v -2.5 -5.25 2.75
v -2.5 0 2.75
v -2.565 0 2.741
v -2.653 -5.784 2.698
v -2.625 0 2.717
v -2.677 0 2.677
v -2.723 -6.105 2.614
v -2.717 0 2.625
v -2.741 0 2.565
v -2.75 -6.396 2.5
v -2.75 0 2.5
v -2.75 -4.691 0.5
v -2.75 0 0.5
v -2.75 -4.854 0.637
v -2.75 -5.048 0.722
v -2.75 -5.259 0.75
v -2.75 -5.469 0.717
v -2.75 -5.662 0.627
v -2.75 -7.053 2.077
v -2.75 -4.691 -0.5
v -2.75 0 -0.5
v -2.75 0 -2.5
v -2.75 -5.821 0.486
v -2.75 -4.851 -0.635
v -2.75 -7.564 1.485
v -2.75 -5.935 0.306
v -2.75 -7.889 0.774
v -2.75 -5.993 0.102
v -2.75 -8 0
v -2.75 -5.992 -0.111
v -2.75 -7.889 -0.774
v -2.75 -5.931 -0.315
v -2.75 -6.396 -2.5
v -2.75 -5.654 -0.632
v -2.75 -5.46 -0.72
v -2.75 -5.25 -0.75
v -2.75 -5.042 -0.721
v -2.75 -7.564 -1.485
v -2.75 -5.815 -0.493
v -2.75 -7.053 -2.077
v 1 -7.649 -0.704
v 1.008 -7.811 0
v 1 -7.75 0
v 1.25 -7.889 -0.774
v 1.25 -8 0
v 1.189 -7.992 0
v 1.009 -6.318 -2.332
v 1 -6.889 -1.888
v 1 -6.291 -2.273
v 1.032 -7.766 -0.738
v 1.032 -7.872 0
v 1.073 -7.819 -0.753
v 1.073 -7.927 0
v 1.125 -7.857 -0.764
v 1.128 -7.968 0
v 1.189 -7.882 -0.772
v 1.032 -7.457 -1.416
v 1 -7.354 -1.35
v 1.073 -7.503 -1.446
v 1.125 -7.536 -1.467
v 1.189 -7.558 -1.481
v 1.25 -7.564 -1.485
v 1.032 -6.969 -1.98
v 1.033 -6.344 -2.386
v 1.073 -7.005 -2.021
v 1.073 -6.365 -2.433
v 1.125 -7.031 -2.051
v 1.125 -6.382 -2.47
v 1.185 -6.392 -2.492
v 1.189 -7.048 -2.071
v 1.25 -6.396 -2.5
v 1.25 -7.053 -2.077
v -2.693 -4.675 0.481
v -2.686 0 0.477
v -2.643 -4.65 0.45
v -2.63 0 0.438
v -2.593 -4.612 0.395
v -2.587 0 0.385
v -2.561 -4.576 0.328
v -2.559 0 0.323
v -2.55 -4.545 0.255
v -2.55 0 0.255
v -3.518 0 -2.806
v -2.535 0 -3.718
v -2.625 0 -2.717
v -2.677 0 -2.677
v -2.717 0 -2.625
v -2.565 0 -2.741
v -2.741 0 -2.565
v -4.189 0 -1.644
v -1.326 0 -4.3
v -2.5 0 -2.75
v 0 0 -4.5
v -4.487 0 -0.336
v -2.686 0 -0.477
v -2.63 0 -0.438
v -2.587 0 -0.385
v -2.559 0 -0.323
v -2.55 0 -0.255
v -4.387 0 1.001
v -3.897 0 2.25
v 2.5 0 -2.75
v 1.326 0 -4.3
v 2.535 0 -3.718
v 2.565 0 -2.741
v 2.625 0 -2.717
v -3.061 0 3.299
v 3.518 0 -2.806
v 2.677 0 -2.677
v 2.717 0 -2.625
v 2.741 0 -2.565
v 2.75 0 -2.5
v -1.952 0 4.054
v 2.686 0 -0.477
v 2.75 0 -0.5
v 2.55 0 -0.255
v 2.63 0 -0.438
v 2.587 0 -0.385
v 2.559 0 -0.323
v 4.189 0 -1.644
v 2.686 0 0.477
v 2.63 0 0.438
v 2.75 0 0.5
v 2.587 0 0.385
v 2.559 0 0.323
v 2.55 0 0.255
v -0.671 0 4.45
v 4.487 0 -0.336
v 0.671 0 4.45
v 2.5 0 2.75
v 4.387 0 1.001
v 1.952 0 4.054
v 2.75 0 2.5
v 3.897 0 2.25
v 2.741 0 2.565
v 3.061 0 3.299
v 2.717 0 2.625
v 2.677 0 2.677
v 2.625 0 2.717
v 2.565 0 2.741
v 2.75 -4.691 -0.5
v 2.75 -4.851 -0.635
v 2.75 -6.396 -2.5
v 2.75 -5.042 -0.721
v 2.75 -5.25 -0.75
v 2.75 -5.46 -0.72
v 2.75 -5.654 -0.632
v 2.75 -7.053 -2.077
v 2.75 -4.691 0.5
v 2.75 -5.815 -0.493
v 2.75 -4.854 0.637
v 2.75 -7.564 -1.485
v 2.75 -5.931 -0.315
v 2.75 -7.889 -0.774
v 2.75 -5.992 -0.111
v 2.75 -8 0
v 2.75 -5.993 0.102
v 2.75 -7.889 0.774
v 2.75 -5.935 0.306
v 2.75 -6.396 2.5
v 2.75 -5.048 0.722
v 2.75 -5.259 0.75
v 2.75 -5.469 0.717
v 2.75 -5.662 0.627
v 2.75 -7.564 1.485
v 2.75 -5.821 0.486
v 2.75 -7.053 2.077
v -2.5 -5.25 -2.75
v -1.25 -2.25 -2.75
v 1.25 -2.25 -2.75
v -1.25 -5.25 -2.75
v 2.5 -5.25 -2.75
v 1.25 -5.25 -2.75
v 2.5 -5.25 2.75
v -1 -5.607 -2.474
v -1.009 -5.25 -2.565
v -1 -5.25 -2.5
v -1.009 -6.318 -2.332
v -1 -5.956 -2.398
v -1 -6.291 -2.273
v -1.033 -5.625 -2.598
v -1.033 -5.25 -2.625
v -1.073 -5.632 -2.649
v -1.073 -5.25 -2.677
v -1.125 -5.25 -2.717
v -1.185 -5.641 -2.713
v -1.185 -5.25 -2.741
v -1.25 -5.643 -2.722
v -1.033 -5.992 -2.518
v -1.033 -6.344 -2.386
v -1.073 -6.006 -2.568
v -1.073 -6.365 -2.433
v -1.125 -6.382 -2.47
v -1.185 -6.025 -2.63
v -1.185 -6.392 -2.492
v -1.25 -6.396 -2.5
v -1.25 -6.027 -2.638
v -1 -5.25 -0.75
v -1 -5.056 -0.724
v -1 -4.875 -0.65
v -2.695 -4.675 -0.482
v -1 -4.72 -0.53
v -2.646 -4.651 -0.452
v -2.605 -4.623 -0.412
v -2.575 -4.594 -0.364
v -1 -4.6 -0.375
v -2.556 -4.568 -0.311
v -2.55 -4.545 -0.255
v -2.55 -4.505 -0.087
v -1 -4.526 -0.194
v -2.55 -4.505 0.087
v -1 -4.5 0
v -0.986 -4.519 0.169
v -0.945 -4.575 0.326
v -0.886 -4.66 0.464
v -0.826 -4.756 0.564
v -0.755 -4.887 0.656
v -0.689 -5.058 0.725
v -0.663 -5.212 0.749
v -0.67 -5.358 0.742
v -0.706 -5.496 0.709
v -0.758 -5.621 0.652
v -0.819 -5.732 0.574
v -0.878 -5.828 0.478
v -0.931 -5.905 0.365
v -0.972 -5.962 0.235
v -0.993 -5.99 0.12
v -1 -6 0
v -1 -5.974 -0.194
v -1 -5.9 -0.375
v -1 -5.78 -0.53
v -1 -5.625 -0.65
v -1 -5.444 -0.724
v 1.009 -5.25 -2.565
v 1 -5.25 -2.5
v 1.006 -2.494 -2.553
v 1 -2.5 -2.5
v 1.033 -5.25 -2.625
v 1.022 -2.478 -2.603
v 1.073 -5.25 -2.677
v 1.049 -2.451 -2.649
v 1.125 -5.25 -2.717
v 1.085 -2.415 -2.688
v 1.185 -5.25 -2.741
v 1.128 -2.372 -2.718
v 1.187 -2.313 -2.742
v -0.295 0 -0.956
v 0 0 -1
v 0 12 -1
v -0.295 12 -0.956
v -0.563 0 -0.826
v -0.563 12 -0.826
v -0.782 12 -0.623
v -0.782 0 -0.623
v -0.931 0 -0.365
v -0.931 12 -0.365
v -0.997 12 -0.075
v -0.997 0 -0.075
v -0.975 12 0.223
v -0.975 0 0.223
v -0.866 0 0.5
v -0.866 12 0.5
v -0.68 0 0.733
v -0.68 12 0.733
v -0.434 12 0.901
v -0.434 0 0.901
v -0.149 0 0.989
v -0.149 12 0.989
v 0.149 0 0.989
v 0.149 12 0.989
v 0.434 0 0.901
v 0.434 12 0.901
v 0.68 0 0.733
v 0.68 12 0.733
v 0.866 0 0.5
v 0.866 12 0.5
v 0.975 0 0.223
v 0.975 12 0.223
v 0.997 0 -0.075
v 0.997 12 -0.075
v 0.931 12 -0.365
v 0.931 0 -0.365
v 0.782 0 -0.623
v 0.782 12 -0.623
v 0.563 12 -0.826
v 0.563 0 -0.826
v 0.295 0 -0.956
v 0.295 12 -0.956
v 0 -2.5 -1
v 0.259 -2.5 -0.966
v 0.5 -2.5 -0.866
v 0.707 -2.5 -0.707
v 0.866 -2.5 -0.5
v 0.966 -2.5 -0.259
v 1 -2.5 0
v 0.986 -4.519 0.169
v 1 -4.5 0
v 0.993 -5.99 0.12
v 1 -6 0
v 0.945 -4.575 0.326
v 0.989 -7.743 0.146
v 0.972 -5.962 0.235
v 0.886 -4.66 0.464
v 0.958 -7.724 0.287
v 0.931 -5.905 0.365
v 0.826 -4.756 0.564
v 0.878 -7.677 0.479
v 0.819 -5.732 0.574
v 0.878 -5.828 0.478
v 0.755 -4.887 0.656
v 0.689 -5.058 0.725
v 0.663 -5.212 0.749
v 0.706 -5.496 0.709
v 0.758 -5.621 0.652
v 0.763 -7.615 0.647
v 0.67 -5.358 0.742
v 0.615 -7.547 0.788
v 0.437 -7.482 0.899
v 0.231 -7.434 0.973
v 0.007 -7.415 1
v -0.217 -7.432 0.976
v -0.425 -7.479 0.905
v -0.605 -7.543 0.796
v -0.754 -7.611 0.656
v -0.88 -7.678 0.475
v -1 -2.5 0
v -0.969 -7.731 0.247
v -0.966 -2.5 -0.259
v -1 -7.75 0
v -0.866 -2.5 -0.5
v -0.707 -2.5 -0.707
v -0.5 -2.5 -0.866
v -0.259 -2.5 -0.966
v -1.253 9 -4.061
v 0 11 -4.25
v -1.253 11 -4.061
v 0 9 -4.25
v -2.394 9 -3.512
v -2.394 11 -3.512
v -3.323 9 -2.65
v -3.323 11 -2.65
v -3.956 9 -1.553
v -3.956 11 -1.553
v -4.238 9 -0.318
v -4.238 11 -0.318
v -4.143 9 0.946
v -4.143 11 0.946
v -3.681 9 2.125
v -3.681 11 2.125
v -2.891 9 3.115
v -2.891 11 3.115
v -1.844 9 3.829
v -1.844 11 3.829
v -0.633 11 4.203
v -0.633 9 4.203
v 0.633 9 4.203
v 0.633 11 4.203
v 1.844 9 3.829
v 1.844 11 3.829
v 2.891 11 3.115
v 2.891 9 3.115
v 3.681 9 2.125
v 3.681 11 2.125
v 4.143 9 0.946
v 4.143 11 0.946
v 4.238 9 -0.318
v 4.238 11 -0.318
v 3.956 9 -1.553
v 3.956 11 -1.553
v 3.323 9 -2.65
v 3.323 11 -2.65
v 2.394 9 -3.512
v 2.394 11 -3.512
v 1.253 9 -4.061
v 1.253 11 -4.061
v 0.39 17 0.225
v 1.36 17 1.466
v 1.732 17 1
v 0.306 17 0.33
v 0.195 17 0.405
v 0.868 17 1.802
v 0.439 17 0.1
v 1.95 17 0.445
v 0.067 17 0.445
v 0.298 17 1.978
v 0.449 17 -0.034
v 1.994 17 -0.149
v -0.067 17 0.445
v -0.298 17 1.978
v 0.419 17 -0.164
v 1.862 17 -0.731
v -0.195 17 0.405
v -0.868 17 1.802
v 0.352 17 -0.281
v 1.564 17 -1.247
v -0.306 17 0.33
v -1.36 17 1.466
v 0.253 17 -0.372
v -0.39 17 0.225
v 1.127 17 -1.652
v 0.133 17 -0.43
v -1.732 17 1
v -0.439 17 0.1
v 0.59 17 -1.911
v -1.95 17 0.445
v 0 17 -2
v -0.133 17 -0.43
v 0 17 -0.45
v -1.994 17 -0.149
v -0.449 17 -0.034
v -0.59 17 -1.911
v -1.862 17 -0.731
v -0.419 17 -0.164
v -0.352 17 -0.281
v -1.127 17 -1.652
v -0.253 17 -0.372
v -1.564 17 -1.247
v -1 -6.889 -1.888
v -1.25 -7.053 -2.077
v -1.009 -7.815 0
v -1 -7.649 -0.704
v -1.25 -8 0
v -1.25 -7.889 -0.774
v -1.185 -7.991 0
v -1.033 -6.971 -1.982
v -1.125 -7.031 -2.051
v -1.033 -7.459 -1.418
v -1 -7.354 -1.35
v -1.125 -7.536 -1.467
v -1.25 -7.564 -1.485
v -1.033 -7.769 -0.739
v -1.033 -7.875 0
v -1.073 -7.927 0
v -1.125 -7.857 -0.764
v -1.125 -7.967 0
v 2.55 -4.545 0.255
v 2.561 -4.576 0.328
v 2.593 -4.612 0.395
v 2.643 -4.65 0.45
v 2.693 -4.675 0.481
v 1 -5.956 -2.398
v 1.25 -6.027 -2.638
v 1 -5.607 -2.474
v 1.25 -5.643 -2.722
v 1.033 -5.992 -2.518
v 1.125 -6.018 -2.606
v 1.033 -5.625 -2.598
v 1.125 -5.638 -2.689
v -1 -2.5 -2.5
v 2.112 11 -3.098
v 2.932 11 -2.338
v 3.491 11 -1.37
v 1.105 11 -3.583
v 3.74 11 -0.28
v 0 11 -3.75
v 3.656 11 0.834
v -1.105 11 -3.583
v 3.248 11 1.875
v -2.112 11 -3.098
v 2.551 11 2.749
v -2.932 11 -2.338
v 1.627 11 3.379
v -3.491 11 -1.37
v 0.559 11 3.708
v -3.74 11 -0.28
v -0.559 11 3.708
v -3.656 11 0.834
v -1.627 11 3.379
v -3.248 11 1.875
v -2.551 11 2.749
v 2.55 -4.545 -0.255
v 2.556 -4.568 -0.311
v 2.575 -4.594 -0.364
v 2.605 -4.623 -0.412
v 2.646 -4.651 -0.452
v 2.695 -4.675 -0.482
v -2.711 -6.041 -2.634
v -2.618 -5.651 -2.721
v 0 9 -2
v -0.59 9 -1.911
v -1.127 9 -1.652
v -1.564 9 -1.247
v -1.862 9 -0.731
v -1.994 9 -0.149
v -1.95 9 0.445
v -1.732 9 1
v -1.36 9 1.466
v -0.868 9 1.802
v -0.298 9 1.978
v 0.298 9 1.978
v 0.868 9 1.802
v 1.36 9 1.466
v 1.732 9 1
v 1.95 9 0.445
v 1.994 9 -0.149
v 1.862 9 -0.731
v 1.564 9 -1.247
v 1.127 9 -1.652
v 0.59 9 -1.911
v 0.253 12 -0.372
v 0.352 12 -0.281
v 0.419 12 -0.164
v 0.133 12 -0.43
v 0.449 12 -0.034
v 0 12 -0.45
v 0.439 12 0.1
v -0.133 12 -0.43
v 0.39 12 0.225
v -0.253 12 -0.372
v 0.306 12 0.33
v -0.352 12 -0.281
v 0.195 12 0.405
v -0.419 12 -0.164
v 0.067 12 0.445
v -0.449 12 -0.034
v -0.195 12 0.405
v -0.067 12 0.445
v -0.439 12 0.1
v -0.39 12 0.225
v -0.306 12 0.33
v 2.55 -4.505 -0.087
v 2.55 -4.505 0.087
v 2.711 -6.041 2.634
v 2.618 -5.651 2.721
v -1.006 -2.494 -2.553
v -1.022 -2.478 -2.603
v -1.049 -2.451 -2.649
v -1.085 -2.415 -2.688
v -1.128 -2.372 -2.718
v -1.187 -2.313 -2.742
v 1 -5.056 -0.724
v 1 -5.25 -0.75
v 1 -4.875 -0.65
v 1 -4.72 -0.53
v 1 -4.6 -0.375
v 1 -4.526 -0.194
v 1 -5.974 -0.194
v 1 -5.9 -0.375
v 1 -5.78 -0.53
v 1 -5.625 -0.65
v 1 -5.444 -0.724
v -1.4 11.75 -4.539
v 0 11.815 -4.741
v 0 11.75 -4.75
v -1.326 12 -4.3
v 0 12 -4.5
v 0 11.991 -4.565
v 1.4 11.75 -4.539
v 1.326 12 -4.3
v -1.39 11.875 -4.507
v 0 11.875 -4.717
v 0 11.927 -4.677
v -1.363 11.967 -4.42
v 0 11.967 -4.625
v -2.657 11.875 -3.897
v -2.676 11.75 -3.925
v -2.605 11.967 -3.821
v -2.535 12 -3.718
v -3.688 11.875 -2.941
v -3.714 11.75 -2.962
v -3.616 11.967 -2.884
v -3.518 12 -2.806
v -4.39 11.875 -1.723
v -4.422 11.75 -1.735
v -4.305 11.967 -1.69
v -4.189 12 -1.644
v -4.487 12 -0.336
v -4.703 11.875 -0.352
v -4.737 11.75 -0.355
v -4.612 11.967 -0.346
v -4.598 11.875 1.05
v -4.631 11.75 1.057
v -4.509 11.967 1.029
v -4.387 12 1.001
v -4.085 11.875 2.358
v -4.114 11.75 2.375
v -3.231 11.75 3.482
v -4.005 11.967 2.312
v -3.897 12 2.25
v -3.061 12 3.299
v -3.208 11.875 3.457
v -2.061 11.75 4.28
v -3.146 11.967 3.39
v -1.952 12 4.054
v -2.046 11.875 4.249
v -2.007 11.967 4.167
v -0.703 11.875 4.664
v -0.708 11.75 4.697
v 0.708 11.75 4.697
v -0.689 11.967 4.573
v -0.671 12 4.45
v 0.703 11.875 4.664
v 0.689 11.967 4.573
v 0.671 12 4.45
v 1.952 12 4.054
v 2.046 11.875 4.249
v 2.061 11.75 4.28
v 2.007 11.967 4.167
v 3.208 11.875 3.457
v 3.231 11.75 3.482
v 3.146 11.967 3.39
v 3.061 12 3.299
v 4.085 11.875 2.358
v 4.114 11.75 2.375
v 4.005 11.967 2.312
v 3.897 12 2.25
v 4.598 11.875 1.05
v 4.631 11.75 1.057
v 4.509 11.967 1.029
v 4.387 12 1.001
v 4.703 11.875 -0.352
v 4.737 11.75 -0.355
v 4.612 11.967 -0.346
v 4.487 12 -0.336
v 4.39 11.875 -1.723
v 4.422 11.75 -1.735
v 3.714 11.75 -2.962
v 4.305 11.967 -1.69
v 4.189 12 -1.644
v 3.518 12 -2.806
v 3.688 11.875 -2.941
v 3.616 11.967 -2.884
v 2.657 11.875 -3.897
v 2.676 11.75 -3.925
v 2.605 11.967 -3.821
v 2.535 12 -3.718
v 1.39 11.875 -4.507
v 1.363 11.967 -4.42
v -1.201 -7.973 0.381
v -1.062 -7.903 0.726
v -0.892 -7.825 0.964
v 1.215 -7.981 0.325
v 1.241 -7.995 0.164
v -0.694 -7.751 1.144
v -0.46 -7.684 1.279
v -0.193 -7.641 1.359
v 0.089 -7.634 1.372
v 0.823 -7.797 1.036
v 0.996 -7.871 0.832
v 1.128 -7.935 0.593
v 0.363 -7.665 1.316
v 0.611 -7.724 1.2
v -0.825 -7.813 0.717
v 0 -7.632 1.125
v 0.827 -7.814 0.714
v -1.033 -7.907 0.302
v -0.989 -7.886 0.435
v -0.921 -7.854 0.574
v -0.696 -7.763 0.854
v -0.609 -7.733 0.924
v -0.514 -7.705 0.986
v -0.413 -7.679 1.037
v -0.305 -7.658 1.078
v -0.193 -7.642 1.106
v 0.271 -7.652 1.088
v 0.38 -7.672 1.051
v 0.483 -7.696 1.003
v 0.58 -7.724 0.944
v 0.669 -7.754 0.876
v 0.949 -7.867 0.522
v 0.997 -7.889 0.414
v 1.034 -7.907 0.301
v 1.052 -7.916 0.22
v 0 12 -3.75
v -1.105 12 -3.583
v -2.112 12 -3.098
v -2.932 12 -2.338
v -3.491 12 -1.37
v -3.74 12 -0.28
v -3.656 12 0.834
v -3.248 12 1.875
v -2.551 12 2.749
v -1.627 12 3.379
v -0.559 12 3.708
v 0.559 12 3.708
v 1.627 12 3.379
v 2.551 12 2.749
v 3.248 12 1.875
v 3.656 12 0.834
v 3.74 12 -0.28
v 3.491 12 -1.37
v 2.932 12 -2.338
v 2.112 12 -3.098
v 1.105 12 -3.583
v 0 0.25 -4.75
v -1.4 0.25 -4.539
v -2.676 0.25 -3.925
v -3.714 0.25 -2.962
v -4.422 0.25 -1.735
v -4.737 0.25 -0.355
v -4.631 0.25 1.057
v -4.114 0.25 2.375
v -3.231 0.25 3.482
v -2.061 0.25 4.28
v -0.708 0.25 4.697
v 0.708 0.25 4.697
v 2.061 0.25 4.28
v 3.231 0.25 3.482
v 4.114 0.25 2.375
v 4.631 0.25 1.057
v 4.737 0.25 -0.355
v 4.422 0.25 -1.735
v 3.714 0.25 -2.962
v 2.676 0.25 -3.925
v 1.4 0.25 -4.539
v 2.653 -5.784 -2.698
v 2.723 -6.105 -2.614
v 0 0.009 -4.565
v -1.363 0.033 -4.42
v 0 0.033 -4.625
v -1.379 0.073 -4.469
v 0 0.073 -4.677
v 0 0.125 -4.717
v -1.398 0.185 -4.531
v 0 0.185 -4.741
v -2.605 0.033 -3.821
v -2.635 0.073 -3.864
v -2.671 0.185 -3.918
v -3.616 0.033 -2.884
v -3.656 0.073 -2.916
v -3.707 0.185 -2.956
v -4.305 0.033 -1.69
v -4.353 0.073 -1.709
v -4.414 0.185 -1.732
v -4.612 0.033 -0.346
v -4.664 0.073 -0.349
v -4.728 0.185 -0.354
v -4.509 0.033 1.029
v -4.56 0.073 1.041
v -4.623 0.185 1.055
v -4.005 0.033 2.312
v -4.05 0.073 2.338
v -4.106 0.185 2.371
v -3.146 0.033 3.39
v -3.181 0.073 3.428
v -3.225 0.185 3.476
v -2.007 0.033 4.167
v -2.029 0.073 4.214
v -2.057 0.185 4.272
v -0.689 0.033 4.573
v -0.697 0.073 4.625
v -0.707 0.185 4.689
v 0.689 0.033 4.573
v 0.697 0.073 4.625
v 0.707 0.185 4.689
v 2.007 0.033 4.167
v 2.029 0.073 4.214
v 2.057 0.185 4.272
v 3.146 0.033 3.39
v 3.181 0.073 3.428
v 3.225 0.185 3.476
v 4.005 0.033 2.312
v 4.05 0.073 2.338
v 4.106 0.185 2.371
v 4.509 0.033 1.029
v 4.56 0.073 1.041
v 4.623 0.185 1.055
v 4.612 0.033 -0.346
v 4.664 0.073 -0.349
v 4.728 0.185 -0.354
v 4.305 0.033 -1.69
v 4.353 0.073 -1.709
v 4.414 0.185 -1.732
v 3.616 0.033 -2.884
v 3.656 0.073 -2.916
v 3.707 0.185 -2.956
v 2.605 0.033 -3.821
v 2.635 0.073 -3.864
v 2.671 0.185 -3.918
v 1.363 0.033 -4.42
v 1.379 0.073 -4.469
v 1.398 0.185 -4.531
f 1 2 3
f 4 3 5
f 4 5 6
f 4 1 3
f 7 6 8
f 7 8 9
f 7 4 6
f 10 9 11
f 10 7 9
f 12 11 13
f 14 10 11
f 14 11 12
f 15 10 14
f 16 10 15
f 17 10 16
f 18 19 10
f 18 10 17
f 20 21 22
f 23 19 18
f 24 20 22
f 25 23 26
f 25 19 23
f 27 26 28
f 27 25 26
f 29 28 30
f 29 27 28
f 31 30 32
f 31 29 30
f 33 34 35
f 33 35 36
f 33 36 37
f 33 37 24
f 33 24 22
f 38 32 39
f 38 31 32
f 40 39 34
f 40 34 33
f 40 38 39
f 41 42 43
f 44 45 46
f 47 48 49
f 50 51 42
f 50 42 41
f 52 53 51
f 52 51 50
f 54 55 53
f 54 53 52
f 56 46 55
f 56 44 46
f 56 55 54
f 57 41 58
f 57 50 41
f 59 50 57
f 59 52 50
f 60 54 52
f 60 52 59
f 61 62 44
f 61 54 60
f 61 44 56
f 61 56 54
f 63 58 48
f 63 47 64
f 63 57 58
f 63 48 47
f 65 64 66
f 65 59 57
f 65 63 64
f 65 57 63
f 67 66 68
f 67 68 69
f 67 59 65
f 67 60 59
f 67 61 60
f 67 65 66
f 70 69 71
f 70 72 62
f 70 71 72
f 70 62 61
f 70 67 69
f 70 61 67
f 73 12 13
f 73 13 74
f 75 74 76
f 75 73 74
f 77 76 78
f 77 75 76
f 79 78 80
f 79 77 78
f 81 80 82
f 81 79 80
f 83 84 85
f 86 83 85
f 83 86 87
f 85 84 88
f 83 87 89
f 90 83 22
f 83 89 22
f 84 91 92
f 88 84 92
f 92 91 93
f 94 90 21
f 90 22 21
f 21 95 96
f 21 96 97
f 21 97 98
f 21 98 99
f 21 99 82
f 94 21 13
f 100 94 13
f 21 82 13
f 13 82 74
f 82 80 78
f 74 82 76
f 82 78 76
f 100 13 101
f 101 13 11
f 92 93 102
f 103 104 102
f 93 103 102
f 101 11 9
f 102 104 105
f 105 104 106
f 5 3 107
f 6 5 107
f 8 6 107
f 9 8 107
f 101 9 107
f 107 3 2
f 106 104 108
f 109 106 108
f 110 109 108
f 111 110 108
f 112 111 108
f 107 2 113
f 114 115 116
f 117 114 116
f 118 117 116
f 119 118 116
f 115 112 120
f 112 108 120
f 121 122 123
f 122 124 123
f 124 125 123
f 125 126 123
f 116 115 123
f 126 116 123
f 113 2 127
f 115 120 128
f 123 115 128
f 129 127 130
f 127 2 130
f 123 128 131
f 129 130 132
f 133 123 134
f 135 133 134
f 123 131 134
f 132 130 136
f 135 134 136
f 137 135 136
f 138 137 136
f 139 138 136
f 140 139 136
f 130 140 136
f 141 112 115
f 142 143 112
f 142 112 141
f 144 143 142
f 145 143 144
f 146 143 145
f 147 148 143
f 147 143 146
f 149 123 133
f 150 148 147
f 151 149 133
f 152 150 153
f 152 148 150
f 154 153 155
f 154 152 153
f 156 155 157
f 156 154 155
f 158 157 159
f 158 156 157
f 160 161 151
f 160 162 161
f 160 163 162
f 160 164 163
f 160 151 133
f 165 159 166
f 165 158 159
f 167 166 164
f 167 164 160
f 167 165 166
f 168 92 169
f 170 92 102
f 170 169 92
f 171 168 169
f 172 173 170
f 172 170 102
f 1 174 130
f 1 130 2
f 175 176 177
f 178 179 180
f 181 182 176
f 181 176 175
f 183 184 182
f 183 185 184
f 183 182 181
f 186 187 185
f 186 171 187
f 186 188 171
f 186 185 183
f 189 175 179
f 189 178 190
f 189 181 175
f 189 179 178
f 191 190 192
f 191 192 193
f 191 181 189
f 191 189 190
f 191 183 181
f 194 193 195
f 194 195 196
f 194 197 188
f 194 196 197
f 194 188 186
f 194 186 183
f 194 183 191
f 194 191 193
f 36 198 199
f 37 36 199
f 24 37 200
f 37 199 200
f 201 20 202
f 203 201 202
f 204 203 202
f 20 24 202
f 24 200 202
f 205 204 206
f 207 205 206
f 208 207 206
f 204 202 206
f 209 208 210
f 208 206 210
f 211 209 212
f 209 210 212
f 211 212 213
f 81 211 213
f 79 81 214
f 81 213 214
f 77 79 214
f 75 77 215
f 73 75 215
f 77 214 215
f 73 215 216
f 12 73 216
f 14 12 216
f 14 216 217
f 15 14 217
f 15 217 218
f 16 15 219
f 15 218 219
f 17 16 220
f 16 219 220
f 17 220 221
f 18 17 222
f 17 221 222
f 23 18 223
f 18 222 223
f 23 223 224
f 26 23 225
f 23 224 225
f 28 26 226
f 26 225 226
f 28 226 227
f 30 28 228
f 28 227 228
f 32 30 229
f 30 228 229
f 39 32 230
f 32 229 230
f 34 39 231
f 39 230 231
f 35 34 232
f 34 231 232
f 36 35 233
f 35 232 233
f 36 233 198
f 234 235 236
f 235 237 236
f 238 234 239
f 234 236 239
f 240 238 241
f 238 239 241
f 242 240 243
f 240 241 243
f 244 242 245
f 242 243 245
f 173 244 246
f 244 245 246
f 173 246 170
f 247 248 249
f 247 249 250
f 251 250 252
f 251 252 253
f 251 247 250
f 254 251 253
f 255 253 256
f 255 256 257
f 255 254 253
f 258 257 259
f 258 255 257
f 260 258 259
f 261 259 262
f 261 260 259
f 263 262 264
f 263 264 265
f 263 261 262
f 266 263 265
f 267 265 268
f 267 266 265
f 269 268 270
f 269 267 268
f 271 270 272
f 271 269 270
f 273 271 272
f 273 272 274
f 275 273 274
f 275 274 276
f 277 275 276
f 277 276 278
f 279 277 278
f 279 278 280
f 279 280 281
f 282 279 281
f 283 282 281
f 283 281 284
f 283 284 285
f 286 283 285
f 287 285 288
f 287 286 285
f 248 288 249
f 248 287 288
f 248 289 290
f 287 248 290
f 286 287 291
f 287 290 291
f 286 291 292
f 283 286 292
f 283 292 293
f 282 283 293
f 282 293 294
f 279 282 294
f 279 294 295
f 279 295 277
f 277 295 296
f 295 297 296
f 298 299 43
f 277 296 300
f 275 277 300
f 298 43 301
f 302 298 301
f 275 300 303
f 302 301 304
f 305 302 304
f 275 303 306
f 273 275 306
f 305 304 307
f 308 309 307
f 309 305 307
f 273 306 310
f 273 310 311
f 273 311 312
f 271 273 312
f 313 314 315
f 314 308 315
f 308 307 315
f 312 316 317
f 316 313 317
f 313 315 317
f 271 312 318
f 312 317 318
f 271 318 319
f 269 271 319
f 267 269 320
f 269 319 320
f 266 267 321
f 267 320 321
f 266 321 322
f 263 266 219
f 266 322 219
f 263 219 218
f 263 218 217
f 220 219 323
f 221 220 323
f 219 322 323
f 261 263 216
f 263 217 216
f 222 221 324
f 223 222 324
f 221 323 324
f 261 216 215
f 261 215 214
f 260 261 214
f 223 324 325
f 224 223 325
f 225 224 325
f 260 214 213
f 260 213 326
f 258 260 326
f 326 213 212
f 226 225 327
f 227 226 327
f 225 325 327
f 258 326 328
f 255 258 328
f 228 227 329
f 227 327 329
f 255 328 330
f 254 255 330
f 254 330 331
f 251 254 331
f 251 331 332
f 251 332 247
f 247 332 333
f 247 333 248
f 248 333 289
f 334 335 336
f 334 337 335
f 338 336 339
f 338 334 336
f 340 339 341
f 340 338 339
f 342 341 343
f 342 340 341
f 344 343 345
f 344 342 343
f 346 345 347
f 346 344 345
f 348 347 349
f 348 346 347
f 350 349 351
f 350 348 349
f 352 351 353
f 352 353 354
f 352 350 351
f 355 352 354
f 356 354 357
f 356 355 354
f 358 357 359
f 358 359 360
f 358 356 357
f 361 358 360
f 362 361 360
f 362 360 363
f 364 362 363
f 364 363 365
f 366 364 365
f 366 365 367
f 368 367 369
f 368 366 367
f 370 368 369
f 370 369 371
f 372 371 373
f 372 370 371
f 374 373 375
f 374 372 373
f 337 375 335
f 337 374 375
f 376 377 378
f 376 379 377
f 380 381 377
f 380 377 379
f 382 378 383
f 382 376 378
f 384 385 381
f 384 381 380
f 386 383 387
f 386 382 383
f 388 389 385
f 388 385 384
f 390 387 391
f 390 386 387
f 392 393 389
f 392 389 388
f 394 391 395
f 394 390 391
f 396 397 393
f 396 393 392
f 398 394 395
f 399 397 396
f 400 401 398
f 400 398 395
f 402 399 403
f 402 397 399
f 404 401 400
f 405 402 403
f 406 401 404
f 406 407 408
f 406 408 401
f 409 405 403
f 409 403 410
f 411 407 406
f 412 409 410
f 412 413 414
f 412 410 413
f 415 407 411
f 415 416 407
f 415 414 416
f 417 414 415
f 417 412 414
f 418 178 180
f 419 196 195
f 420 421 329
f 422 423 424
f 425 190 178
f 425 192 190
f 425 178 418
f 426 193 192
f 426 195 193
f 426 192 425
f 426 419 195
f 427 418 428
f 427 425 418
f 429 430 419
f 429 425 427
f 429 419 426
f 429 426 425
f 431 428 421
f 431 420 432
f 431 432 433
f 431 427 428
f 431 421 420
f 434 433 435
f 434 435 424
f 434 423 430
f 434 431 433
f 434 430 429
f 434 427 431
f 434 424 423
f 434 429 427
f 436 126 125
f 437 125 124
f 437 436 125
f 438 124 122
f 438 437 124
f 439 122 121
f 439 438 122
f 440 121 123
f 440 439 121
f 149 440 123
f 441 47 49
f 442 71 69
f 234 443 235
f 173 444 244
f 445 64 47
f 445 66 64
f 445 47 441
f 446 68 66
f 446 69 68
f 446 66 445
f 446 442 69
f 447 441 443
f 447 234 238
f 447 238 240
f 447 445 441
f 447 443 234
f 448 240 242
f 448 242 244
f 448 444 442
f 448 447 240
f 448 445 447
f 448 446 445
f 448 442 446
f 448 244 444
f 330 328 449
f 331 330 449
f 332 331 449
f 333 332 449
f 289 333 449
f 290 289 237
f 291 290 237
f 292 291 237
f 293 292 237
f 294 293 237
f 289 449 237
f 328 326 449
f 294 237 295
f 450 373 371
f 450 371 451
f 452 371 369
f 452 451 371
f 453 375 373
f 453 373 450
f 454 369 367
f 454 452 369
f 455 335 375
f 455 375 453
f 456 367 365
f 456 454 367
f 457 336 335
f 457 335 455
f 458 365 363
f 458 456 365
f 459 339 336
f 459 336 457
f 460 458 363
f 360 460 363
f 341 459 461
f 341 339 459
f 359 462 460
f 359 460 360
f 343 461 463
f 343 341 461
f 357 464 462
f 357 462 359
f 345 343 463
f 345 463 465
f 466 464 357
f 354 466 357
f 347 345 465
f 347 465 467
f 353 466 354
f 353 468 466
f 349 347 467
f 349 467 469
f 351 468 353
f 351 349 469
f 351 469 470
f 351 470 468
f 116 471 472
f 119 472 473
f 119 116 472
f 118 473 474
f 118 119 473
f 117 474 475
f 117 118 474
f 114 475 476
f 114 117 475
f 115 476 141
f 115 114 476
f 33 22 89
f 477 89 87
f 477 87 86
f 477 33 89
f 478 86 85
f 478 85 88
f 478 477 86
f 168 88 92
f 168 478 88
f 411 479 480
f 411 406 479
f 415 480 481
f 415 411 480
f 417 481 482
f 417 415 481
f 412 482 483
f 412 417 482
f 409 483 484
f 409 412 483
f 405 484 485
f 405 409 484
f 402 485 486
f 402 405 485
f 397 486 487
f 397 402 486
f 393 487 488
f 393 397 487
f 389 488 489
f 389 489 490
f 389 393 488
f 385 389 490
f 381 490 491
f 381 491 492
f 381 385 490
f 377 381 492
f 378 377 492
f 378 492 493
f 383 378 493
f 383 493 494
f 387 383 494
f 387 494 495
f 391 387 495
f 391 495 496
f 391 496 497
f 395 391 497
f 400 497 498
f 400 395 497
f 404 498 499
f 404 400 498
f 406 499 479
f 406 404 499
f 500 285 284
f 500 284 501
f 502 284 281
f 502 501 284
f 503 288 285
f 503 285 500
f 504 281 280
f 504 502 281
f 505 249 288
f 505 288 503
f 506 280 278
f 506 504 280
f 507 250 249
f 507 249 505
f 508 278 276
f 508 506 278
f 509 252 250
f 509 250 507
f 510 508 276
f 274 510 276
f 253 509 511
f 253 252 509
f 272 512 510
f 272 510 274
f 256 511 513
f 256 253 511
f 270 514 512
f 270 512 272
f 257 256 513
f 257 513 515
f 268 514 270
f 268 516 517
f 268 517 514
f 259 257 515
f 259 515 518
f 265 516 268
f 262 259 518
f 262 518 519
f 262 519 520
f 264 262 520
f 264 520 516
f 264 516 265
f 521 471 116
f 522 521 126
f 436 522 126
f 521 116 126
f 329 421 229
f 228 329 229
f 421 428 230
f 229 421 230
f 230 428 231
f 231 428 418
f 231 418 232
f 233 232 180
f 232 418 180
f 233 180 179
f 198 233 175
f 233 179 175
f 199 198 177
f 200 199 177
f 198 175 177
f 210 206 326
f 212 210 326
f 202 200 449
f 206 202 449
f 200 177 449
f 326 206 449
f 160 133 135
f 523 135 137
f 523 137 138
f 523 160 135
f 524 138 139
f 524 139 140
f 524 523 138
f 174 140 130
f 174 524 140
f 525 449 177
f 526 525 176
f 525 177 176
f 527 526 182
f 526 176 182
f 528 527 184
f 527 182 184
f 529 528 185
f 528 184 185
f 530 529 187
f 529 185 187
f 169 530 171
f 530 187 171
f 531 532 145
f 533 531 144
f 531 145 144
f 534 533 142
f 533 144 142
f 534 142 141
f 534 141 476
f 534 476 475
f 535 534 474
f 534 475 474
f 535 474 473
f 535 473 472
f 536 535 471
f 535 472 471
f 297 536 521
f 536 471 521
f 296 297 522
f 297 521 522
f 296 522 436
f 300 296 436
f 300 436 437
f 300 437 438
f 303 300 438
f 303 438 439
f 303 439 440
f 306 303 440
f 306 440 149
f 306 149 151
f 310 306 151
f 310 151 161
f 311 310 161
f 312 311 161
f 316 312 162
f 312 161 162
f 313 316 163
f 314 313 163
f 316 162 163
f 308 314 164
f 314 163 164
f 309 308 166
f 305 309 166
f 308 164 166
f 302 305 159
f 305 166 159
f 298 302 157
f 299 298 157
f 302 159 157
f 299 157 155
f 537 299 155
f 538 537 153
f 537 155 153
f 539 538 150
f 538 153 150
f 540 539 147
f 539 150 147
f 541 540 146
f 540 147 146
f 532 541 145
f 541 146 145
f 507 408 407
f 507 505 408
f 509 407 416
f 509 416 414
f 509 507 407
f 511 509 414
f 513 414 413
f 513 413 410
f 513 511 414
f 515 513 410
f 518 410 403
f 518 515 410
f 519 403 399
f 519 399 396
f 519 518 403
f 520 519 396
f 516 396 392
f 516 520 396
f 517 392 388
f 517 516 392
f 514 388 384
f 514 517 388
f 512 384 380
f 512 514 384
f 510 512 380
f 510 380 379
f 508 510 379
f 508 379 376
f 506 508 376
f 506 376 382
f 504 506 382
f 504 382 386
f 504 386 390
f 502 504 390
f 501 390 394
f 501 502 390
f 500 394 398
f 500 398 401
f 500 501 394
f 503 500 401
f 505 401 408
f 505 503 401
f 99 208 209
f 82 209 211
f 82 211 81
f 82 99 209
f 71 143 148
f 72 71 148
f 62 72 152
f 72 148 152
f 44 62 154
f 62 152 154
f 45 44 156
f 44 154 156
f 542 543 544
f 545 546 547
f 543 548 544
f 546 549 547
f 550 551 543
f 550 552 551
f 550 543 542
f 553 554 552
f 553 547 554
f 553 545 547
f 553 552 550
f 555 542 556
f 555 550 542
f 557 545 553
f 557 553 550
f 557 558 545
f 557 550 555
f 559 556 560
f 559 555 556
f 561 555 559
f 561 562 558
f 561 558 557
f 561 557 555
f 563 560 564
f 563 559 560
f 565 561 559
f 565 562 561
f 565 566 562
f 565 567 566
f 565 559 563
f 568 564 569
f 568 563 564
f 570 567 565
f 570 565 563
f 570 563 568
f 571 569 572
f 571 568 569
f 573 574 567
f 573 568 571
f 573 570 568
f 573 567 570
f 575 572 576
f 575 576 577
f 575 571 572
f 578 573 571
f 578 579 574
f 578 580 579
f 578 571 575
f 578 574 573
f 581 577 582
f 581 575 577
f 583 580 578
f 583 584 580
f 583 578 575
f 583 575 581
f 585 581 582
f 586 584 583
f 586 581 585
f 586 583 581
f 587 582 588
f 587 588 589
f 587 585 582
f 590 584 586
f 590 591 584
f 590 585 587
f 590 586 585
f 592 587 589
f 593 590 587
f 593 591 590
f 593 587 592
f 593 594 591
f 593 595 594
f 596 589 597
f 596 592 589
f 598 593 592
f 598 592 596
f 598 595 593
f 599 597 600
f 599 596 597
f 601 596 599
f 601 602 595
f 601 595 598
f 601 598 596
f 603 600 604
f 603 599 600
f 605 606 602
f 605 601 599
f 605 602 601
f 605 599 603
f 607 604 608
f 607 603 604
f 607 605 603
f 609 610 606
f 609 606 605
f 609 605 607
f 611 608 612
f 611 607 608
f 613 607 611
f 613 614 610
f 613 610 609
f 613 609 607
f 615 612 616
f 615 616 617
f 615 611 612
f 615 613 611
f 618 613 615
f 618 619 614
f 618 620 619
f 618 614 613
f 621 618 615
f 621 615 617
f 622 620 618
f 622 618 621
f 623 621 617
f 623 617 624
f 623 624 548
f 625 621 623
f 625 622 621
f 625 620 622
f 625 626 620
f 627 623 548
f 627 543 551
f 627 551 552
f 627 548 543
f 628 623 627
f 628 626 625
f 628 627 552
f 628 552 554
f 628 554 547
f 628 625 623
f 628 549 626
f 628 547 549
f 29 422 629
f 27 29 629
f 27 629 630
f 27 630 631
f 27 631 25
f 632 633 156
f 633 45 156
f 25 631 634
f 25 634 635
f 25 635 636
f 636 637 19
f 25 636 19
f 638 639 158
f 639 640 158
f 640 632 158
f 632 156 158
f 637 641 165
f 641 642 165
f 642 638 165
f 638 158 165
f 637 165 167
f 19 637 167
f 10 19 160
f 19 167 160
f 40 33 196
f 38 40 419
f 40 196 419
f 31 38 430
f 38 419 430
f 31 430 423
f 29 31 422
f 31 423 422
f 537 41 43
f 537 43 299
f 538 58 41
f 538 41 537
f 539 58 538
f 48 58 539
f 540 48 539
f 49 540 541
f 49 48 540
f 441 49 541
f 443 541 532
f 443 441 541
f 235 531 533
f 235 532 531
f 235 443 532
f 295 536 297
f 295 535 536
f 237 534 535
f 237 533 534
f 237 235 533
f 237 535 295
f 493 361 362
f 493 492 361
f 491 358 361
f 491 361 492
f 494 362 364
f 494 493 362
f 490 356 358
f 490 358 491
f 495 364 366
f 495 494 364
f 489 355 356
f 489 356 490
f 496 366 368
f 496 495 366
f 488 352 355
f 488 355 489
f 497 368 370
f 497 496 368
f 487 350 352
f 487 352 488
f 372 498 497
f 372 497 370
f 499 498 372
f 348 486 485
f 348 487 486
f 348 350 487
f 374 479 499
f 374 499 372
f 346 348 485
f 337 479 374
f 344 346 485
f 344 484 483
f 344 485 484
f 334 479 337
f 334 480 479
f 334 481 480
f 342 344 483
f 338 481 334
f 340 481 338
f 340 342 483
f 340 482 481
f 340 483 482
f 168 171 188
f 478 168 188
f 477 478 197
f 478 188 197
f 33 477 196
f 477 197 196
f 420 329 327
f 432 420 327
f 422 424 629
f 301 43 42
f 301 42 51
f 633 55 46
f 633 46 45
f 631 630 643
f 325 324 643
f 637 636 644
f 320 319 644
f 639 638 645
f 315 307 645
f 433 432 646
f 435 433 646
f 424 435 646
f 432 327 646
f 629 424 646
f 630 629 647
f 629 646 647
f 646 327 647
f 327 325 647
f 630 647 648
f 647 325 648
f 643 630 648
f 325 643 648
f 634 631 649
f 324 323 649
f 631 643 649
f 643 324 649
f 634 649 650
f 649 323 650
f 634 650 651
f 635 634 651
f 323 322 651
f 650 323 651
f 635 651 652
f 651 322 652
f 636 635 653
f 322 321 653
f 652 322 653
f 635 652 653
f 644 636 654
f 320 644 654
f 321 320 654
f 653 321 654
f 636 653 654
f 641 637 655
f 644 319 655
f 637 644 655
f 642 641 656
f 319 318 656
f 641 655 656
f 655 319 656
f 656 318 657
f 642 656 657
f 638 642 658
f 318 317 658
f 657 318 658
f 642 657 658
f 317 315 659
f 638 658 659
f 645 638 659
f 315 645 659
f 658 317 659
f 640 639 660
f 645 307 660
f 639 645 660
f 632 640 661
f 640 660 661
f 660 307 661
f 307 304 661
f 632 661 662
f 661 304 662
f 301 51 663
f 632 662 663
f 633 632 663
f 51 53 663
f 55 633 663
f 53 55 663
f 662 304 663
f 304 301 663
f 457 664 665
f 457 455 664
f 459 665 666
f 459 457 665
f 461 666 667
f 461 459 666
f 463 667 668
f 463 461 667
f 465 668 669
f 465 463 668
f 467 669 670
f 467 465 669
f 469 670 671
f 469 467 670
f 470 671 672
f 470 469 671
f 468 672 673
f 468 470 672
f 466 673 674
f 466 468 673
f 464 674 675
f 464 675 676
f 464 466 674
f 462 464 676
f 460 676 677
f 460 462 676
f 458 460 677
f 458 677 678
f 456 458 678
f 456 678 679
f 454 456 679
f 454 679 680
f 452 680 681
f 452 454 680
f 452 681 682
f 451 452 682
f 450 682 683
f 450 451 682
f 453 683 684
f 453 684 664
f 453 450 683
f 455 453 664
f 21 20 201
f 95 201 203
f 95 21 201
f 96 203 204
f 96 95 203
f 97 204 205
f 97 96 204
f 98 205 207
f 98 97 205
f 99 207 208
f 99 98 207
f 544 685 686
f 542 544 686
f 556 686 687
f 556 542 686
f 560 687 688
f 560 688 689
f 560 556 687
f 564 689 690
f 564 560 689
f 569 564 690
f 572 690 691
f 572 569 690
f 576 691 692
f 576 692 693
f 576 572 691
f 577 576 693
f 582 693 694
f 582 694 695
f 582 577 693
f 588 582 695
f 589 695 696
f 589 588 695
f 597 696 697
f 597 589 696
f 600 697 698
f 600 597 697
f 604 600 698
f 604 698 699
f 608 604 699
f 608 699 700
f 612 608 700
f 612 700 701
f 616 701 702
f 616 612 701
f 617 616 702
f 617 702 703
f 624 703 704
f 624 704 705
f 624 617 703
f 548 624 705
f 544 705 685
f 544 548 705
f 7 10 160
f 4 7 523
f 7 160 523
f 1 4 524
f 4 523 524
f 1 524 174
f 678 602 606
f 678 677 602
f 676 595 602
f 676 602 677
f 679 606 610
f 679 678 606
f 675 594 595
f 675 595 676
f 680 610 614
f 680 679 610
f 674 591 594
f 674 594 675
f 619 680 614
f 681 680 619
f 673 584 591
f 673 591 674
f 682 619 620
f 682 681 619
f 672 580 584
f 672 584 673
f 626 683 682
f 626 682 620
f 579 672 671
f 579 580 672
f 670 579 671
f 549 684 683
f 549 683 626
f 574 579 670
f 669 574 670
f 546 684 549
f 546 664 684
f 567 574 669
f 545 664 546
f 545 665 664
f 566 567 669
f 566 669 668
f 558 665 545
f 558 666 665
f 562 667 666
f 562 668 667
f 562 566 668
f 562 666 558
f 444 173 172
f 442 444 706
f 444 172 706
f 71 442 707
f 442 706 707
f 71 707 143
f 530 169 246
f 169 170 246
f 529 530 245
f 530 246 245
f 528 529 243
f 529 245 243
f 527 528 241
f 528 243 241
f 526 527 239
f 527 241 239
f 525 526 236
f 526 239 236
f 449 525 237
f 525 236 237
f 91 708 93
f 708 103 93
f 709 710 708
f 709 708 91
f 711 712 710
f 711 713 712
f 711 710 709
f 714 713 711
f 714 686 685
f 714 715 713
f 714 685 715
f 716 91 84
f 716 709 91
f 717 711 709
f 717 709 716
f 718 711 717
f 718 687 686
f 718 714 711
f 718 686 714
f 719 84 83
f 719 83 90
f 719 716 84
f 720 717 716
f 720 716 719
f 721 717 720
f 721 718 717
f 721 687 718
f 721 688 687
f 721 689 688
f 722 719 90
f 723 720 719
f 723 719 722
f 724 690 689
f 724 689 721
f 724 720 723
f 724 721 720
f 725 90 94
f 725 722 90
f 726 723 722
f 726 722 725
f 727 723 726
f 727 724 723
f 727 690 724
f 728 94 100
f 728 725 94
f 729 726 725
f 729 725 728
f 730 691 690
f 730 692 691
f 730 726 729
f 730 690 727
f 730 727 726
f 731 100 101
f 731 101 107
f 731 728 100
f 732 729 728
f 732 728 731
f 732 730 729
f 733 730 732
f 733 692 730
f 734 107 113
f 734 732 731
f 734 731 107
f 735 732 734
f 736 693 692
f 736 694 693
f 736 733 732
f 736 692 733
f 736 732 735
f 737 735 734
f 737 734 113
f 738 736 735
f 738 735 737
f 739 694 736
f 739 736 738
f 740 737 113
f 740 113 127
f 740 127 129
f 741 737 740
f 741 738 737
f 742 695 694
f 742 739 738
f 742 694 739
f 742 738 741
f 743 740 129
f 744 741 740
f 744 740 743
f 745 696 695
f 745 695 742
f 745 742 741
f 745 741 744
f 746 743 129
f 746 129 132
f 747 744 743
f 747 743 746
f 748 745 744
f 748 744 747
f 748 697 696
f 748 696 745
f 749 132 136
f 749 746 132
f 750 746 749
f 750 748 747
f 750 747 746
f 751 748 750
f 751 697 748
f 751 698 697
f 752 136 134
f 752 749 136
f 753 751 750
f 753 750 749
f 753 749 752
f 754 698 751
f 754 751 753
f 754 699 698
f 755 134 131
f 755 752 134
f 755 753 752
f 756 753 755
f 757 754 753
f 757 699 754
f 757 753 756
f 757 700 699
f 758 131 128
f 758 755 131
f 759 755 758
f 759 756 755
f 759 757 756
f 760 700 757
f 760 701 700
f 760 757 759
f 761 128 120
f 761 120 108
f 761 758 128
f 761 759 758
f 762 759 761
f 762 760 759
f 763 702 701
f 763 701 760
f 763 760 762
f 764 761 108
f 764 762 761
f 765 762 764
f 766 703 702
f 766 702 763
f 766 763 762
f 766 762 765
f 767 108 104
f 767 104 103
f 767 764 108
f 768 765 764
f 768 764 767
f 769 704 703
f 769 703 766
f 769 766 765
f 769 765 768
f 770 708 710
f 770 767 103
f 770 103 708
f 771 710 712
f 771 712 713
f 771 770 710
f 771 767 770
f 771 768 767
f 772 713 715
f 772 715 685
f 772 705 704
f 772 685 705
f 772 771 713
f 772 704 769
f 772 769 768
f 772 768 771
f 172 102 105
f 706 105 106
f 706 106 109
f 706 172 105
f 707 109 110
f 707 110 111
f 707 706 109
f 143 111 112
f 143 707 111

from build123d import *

# Parameters (mm, degrees)
BOSS_EXTRU_2_START      = 8
ESQUISSE4_R             = 1
BOSS_EXTRU_2_DEPTH      = 8
ENL_V_MAT_EXTRU_1_DEPTH = 20.178438414
ENL_V_MAT_EXTRU_2_REACH = 21.178
ESQUISSE6_W             = 2
ESQUISSE6_H             = 5.5
CONG_1_R                = 0.25
ESQUISSE7_W             = 1
ESQUISSE7_H             = 4.690983006
ENL_V_MAT_EXTRU_3_DEPTH = 0.2
CONG_2_R                = 0.25
CONG_2_OF_SYM_TRIE1_R   = 0.25


with BuildPart() as part:
    # Esquisse1 → Révolution1 (revolve)
    with BuildSketch(Plane.XY, mode=Mode.PRIVATE) as r_volution1_sk:
        with BuildLine():
            Line((2, 9), (2, 17))
            Line((2, 17), (0.45, 17))
            Line((0.45, 17), (0.45, 12))
            Line((0.45, 12), (1, 12))
            Line((1, 12), (1, 0))
            Line((1, 0), (4.5, 0))
            ThreePointArc((4.5, 0), (4.676776695, 0.073223305), (4.75, 0.25))
            Line((4.75, 0.25), (4.75, 11.75))
            ThreePointArc((4.75, 11.75), (4.676776695, 11.926776695), (4.5, 12))
            Line((4.5, 12), (3.75, 12))
            Line((3.75, 12), (3.75, 11))
            Line((3.75, 11), (4.25, 11))
            Line((4.25, 11), (4.25, 9))
            Line((4.25, 9), (2, 9))
        make_face()
    revolve(r_volution1_sk.sketch.rotate(Axis((0, 0, 0), (0, 1, 0)), 90), axis=Axis((0, 0, 0), (0, 1, 0)))

    # Esquisse4 → Boss.-Extru.2 (add)
    with BuildSketch(Plane.XZ.offset(BOSS_EXTRU_2_START)):
        with BuildLine():
            Line((-2.5, -2.75), (2.5, -2.75))
            ThreePointArc((2.5, -2.75), (2.676776695, -2.676776695), (2.75, -2.5))
            Line((2.75, -2.5), (2.75, 2.5))
            ThreePointArc((2.75, 2.5), (2.676776695, 2.676776695), (2.5, 2.75))
            Line((2.5, 2.75), (-2.5, 2.75))
            ThreePointArc((-2.5, 2.75), (-2.676776695, 2.676776695), (-2.75, 2.5))
            Line((-2.75, 2.5), (-2.75, -2.5))
            ThreePointArc((-2.75, -2.5), (-2.676776695, -2.676776695), (-2.5, -2.75))
        make_face()
        with Locations(Location((0, 0, 0), (0, 0, 270))):
            Circle(ESQUISSE4_R, mode=Mode.SUBTRACT)
    extrude(amount=-BOSS_EXTRU_2_DEPTH)

    # Esquisse5 → Enlèv. mat.-Extru.1 (cut, through all)
    with BuildSketch(Plane(origin=(2.75, 0, 0), x_dir=(0, 0, -1), z_dir=(1, 0, 0))):
        with BuildLine():
            Line((-2.5, -8), (0, -8))
            ThreePointArc((0, -8), (-1.48525742, -7.564413618), (-2.5, -6.395643924))
            Line((-2.5, -6.395643924), (-2.5, -8))
        make_face()
        with BuildLine():
            Line((2.5, -8), (2.5, -6.395643924))
            ThreePointArc((2.5, -6.395643924), (1.48525742, -7.564413618), (0, -8))
            Line((0, -8), (2.5, -8))
        make_face()
        with BuildLine():
            Line((-2.75, -8), (-2.5, -8))
            Line((-2.5, -8), (-2.5, -6.395643924))
            ThreePointArc((-2.5, -6.395643924), (-2.686773158, -5.83630197), (-2.75, -5.25))
            Line((-2.75, -5.25), (-2.75, -8))
        make_face()
        with BuildLine():
            Line((2.75, -8), (2.75, -5.25))
            ThreePointArc((2.75, -5.25), (2.686773158, -5.83630197), (2.5, -6.395643924))
            Line((2.5, -6.395643924), (2.5, -8))
            Line((2.5, -8), (2.75, -8))
        make_face()
        with BuildLine():
            ThreePointArc((-0.75, -5.25), (0, -6), (0.75, -5.25))
            Line((0.75, -5.25), (-0.75, -5.25))
        make_face()
        with BuildLine():
            Line((-0.75, -5.25), (0.75, -5.25))
            ThreePointArc((0.75, -5.25), (0, -4.5), (-0.75, -5.25))
        make_face()
    extrude(amount=-ENL_V_MAT_EXTRU_1_DEPTH, mode=Mode.SUBTRACT)

    # Esquisse6 → Enlèv. mat.-Extru.2 (cut, up to next)
    with BuildSketch(Plane.XY.offset(-2.75), mode=Mode.PRIVATE) as enl_v_mat_extru_2_sk1:
        with Locations((0, -5.25)):
            Rectangle(ESQUISSE6_W, ESQUISSE6_H)
    enl_v_mat_extru_2_tool1 = extrude(enl_v_mat_extru_2_sk1.sketch, amount=ENL_V_MAT_EXTRU_2_REACH, mode=Mode.PRIVATE) & part.part
    add(enl_v_mat_extru_2_tool1.solids().sort_by_distance((0, -5.25, -2.75))[0], mode=Mode.SUBTRACT)

    # Congé1
    cong_1_edges = [part.edges().sort_by_distance(p)[0] for p in [
        (1, -7.194543649, -1.944543647),
        (-1, -7.194543648, -1.944543648),
        (-1, -3.875, -2.75),
        (0, -2.5, -2.75),
        (1, -3.875, -2.75),
        (0, -7.811737691, 1),
    ]]
    fillet(cong_1_edges, radius=CONG_1_R)

    # Esquisse7 → Enlèv. mat.-Extru.3 (cut)
    with BuildSketch(Plane.ZY.offset(2.75)):
        with Locations((0, -2.345491503)):
            Rectangle(ESQUISSE7_W, ESQUISSE7_H)
    enl_v_mat_extru_3 = extrude(amount=-ENL_V_MAT_EXTRU_3_DEPTH, mode=Mode.SUBTRACT)

    # Congé2
    # the kernel refuses this fillet: 0.25 mm, written as the material it adds along each edge
    with BuildSketch(Plane(origin=(-2.55, -5.303355441, 0.5), x_dir=(-1.0, 0, -1.569855356819468e-12), z_dir=(0, 1, 0))) as cong_2_piece_1_section:
        with BuildLine():
            CenterArc((0.25, -0.244948974), CONG_2_R, 101.536959033, 78.463040967)
            Line((0, -0.244948974), (-0.005, -0.244948974))
            Line((-0.005, -0.244948974), (-0.005, 0))
            Line((-0.005, 0), (0, 0.005))
            ThreePointArc((0, 0.005), (0.1, 0.005), (0.199, 0.004898979))
            Line((0.199, 0.004898979), (0.2, 0))
        make_face()
    cong_2_piece_1 = extrude(amount=5.915727877, mode=Mode.PRIVATE)
    cong_2_piece_1 = cong_2_piece_1 - Plane(origin=(-2.600107301, -5.25, 0), x_dir=(0, 0, 1), z_dir=(1, 0, 0)) * Cylinder(0.75, 13, mode=Mode.PRIVATE)
    add(cong_2_piece_1)
    with BuildSketch(Plane(origin=(-2.55, 0.612372436, -0.5), x_dir=(-1.0, 0, 1.569855356819468e-12), z_dir=(0, -1, 0))) as cong_2_piece_2_section:
        with BuildLine():
            CenterArc((0.25, -0.244948974), CONG_2_R, 101.536959033, 78.463040967)
            Line((0, -0.244948974), (-0.005, -0.244948974))
            Line((-0.005, -0.244948974), (-0.005, 0))
            Line((-0.005, 0), (0, 0.005))
            ThreePointArc((0, 0.005), (0.1, 0.005), (0.199, 0.004898979))
            Line((0.199, 0.004898979), (0.2, 0))
        make_face()
    cong_2_piece_2 = extrude(amount=5.915727877, mode=Mode.PRIVATE)
    cong_2_piece_2 = cong_2_piece_2 - Plane(origin=(-2.599890025, -5.25, 0), x_dir=(0, 0, 1), z_dir=(1, 0, 0)) * Cylinder(0.75, 13, mode=Mode.PRIVATE)
    add(cong_2_piece_2)

    # Symétrie1: Enlèv. mat.-Extru.3 across plane
    add(enl_v_mat_extru_3.mirror(Plane(origin=(0, 0, 0), x_dir=(0, 0, 1), z_dir=(1, 0, 0))), mode=Mode.SUBTRACT)

    # Congé2 of Symétrie1
    # the kernel refuses this fillet: 0.25 mm, written as the material it adds along each edge
    with BuildSketch(Plane(origin=(2.55, -5.303355441, 0.5), x_dir=(0, 0, -1), z_dir=(0, 1, 0))) as cong_2_of_sym_trie1_piece_1_section:
        with BuildLine():
            CenterArc((0.244948974, -0.25), CONG_2_OF_SYM_TRIE1_R, 90, 78.463040967)
            Line((0, -0.2), (-0.004898979, -0.199))
            ThreePointArc((-0.004898979, -0.199), (-0.005, -0.1), (-0.005, 0))
            Line((-0.005, 0), (0, 0.005))
            Line((0, 0.005), (0.244948974, 0.005))
            Line((0.244948974, 0.005), (0.244948974, 0))
        make_face()
    cong_2_of_sym_trie1_piece_1 = extrude(amount=5.915727877, mode=Mode.PRIVATE)
    cong_2_of_sym_trie1_piece_1 = cong_2_of_sym_trie1_piece_1 - Plane(origin=(2.600107302, -5.25, 0), x_dir=(0, 0, 1), z_dir=(1, 0, 0)) * Cylinder(0.75, 13, mode=Mode.PRIVATE)
    add(cong_2_of_sym_trie1_piece_1)
    with BuildSketch(Plane(origin=(2.55, 0.612372436, -0.5), x_dir=(1.0, 0, 1.569855356819468e-12), z_dir=(0, -1, 0))) as cong_2_of_sym_trie1_piece_2_section:
        with BuildLine():
            CenterArc((0.25, 0.244948974), CONG_2_OF_SYM_TRIE1_R, 180, 78.463040967)
            Line((0, 0.244948974), (-0.005, 0.244948974))
            Line((-0.005, 0.244948974), (-0.005, 0))
            Line((-0.005, 0), (0, -0.005))
            ThreePointArc((0, -0.005), (0.1, -0.005), (0.199, -0.004898979))
            Line((0.199, -0.004898979), (0.2, 0))
        make_face()
    cong_2_of_sym_trie1_piece_2 = extrude(amount=5.915727877, mode=Mode.PRIVATE)
    cong_2_of_sym_trie1_piece_2 = cong_2_of_sym_trie1_piece_2 - Plane(origin=(2.599890025, -5.25, 0), x_dir=(0, 0, 1), z_dir=(1, 0, 0)) * Cylinder(0.75, 13, mode=Mode.PRIVATE)
    add(cong_2_of_sym_trie1_piece_2)


solid = part.part
